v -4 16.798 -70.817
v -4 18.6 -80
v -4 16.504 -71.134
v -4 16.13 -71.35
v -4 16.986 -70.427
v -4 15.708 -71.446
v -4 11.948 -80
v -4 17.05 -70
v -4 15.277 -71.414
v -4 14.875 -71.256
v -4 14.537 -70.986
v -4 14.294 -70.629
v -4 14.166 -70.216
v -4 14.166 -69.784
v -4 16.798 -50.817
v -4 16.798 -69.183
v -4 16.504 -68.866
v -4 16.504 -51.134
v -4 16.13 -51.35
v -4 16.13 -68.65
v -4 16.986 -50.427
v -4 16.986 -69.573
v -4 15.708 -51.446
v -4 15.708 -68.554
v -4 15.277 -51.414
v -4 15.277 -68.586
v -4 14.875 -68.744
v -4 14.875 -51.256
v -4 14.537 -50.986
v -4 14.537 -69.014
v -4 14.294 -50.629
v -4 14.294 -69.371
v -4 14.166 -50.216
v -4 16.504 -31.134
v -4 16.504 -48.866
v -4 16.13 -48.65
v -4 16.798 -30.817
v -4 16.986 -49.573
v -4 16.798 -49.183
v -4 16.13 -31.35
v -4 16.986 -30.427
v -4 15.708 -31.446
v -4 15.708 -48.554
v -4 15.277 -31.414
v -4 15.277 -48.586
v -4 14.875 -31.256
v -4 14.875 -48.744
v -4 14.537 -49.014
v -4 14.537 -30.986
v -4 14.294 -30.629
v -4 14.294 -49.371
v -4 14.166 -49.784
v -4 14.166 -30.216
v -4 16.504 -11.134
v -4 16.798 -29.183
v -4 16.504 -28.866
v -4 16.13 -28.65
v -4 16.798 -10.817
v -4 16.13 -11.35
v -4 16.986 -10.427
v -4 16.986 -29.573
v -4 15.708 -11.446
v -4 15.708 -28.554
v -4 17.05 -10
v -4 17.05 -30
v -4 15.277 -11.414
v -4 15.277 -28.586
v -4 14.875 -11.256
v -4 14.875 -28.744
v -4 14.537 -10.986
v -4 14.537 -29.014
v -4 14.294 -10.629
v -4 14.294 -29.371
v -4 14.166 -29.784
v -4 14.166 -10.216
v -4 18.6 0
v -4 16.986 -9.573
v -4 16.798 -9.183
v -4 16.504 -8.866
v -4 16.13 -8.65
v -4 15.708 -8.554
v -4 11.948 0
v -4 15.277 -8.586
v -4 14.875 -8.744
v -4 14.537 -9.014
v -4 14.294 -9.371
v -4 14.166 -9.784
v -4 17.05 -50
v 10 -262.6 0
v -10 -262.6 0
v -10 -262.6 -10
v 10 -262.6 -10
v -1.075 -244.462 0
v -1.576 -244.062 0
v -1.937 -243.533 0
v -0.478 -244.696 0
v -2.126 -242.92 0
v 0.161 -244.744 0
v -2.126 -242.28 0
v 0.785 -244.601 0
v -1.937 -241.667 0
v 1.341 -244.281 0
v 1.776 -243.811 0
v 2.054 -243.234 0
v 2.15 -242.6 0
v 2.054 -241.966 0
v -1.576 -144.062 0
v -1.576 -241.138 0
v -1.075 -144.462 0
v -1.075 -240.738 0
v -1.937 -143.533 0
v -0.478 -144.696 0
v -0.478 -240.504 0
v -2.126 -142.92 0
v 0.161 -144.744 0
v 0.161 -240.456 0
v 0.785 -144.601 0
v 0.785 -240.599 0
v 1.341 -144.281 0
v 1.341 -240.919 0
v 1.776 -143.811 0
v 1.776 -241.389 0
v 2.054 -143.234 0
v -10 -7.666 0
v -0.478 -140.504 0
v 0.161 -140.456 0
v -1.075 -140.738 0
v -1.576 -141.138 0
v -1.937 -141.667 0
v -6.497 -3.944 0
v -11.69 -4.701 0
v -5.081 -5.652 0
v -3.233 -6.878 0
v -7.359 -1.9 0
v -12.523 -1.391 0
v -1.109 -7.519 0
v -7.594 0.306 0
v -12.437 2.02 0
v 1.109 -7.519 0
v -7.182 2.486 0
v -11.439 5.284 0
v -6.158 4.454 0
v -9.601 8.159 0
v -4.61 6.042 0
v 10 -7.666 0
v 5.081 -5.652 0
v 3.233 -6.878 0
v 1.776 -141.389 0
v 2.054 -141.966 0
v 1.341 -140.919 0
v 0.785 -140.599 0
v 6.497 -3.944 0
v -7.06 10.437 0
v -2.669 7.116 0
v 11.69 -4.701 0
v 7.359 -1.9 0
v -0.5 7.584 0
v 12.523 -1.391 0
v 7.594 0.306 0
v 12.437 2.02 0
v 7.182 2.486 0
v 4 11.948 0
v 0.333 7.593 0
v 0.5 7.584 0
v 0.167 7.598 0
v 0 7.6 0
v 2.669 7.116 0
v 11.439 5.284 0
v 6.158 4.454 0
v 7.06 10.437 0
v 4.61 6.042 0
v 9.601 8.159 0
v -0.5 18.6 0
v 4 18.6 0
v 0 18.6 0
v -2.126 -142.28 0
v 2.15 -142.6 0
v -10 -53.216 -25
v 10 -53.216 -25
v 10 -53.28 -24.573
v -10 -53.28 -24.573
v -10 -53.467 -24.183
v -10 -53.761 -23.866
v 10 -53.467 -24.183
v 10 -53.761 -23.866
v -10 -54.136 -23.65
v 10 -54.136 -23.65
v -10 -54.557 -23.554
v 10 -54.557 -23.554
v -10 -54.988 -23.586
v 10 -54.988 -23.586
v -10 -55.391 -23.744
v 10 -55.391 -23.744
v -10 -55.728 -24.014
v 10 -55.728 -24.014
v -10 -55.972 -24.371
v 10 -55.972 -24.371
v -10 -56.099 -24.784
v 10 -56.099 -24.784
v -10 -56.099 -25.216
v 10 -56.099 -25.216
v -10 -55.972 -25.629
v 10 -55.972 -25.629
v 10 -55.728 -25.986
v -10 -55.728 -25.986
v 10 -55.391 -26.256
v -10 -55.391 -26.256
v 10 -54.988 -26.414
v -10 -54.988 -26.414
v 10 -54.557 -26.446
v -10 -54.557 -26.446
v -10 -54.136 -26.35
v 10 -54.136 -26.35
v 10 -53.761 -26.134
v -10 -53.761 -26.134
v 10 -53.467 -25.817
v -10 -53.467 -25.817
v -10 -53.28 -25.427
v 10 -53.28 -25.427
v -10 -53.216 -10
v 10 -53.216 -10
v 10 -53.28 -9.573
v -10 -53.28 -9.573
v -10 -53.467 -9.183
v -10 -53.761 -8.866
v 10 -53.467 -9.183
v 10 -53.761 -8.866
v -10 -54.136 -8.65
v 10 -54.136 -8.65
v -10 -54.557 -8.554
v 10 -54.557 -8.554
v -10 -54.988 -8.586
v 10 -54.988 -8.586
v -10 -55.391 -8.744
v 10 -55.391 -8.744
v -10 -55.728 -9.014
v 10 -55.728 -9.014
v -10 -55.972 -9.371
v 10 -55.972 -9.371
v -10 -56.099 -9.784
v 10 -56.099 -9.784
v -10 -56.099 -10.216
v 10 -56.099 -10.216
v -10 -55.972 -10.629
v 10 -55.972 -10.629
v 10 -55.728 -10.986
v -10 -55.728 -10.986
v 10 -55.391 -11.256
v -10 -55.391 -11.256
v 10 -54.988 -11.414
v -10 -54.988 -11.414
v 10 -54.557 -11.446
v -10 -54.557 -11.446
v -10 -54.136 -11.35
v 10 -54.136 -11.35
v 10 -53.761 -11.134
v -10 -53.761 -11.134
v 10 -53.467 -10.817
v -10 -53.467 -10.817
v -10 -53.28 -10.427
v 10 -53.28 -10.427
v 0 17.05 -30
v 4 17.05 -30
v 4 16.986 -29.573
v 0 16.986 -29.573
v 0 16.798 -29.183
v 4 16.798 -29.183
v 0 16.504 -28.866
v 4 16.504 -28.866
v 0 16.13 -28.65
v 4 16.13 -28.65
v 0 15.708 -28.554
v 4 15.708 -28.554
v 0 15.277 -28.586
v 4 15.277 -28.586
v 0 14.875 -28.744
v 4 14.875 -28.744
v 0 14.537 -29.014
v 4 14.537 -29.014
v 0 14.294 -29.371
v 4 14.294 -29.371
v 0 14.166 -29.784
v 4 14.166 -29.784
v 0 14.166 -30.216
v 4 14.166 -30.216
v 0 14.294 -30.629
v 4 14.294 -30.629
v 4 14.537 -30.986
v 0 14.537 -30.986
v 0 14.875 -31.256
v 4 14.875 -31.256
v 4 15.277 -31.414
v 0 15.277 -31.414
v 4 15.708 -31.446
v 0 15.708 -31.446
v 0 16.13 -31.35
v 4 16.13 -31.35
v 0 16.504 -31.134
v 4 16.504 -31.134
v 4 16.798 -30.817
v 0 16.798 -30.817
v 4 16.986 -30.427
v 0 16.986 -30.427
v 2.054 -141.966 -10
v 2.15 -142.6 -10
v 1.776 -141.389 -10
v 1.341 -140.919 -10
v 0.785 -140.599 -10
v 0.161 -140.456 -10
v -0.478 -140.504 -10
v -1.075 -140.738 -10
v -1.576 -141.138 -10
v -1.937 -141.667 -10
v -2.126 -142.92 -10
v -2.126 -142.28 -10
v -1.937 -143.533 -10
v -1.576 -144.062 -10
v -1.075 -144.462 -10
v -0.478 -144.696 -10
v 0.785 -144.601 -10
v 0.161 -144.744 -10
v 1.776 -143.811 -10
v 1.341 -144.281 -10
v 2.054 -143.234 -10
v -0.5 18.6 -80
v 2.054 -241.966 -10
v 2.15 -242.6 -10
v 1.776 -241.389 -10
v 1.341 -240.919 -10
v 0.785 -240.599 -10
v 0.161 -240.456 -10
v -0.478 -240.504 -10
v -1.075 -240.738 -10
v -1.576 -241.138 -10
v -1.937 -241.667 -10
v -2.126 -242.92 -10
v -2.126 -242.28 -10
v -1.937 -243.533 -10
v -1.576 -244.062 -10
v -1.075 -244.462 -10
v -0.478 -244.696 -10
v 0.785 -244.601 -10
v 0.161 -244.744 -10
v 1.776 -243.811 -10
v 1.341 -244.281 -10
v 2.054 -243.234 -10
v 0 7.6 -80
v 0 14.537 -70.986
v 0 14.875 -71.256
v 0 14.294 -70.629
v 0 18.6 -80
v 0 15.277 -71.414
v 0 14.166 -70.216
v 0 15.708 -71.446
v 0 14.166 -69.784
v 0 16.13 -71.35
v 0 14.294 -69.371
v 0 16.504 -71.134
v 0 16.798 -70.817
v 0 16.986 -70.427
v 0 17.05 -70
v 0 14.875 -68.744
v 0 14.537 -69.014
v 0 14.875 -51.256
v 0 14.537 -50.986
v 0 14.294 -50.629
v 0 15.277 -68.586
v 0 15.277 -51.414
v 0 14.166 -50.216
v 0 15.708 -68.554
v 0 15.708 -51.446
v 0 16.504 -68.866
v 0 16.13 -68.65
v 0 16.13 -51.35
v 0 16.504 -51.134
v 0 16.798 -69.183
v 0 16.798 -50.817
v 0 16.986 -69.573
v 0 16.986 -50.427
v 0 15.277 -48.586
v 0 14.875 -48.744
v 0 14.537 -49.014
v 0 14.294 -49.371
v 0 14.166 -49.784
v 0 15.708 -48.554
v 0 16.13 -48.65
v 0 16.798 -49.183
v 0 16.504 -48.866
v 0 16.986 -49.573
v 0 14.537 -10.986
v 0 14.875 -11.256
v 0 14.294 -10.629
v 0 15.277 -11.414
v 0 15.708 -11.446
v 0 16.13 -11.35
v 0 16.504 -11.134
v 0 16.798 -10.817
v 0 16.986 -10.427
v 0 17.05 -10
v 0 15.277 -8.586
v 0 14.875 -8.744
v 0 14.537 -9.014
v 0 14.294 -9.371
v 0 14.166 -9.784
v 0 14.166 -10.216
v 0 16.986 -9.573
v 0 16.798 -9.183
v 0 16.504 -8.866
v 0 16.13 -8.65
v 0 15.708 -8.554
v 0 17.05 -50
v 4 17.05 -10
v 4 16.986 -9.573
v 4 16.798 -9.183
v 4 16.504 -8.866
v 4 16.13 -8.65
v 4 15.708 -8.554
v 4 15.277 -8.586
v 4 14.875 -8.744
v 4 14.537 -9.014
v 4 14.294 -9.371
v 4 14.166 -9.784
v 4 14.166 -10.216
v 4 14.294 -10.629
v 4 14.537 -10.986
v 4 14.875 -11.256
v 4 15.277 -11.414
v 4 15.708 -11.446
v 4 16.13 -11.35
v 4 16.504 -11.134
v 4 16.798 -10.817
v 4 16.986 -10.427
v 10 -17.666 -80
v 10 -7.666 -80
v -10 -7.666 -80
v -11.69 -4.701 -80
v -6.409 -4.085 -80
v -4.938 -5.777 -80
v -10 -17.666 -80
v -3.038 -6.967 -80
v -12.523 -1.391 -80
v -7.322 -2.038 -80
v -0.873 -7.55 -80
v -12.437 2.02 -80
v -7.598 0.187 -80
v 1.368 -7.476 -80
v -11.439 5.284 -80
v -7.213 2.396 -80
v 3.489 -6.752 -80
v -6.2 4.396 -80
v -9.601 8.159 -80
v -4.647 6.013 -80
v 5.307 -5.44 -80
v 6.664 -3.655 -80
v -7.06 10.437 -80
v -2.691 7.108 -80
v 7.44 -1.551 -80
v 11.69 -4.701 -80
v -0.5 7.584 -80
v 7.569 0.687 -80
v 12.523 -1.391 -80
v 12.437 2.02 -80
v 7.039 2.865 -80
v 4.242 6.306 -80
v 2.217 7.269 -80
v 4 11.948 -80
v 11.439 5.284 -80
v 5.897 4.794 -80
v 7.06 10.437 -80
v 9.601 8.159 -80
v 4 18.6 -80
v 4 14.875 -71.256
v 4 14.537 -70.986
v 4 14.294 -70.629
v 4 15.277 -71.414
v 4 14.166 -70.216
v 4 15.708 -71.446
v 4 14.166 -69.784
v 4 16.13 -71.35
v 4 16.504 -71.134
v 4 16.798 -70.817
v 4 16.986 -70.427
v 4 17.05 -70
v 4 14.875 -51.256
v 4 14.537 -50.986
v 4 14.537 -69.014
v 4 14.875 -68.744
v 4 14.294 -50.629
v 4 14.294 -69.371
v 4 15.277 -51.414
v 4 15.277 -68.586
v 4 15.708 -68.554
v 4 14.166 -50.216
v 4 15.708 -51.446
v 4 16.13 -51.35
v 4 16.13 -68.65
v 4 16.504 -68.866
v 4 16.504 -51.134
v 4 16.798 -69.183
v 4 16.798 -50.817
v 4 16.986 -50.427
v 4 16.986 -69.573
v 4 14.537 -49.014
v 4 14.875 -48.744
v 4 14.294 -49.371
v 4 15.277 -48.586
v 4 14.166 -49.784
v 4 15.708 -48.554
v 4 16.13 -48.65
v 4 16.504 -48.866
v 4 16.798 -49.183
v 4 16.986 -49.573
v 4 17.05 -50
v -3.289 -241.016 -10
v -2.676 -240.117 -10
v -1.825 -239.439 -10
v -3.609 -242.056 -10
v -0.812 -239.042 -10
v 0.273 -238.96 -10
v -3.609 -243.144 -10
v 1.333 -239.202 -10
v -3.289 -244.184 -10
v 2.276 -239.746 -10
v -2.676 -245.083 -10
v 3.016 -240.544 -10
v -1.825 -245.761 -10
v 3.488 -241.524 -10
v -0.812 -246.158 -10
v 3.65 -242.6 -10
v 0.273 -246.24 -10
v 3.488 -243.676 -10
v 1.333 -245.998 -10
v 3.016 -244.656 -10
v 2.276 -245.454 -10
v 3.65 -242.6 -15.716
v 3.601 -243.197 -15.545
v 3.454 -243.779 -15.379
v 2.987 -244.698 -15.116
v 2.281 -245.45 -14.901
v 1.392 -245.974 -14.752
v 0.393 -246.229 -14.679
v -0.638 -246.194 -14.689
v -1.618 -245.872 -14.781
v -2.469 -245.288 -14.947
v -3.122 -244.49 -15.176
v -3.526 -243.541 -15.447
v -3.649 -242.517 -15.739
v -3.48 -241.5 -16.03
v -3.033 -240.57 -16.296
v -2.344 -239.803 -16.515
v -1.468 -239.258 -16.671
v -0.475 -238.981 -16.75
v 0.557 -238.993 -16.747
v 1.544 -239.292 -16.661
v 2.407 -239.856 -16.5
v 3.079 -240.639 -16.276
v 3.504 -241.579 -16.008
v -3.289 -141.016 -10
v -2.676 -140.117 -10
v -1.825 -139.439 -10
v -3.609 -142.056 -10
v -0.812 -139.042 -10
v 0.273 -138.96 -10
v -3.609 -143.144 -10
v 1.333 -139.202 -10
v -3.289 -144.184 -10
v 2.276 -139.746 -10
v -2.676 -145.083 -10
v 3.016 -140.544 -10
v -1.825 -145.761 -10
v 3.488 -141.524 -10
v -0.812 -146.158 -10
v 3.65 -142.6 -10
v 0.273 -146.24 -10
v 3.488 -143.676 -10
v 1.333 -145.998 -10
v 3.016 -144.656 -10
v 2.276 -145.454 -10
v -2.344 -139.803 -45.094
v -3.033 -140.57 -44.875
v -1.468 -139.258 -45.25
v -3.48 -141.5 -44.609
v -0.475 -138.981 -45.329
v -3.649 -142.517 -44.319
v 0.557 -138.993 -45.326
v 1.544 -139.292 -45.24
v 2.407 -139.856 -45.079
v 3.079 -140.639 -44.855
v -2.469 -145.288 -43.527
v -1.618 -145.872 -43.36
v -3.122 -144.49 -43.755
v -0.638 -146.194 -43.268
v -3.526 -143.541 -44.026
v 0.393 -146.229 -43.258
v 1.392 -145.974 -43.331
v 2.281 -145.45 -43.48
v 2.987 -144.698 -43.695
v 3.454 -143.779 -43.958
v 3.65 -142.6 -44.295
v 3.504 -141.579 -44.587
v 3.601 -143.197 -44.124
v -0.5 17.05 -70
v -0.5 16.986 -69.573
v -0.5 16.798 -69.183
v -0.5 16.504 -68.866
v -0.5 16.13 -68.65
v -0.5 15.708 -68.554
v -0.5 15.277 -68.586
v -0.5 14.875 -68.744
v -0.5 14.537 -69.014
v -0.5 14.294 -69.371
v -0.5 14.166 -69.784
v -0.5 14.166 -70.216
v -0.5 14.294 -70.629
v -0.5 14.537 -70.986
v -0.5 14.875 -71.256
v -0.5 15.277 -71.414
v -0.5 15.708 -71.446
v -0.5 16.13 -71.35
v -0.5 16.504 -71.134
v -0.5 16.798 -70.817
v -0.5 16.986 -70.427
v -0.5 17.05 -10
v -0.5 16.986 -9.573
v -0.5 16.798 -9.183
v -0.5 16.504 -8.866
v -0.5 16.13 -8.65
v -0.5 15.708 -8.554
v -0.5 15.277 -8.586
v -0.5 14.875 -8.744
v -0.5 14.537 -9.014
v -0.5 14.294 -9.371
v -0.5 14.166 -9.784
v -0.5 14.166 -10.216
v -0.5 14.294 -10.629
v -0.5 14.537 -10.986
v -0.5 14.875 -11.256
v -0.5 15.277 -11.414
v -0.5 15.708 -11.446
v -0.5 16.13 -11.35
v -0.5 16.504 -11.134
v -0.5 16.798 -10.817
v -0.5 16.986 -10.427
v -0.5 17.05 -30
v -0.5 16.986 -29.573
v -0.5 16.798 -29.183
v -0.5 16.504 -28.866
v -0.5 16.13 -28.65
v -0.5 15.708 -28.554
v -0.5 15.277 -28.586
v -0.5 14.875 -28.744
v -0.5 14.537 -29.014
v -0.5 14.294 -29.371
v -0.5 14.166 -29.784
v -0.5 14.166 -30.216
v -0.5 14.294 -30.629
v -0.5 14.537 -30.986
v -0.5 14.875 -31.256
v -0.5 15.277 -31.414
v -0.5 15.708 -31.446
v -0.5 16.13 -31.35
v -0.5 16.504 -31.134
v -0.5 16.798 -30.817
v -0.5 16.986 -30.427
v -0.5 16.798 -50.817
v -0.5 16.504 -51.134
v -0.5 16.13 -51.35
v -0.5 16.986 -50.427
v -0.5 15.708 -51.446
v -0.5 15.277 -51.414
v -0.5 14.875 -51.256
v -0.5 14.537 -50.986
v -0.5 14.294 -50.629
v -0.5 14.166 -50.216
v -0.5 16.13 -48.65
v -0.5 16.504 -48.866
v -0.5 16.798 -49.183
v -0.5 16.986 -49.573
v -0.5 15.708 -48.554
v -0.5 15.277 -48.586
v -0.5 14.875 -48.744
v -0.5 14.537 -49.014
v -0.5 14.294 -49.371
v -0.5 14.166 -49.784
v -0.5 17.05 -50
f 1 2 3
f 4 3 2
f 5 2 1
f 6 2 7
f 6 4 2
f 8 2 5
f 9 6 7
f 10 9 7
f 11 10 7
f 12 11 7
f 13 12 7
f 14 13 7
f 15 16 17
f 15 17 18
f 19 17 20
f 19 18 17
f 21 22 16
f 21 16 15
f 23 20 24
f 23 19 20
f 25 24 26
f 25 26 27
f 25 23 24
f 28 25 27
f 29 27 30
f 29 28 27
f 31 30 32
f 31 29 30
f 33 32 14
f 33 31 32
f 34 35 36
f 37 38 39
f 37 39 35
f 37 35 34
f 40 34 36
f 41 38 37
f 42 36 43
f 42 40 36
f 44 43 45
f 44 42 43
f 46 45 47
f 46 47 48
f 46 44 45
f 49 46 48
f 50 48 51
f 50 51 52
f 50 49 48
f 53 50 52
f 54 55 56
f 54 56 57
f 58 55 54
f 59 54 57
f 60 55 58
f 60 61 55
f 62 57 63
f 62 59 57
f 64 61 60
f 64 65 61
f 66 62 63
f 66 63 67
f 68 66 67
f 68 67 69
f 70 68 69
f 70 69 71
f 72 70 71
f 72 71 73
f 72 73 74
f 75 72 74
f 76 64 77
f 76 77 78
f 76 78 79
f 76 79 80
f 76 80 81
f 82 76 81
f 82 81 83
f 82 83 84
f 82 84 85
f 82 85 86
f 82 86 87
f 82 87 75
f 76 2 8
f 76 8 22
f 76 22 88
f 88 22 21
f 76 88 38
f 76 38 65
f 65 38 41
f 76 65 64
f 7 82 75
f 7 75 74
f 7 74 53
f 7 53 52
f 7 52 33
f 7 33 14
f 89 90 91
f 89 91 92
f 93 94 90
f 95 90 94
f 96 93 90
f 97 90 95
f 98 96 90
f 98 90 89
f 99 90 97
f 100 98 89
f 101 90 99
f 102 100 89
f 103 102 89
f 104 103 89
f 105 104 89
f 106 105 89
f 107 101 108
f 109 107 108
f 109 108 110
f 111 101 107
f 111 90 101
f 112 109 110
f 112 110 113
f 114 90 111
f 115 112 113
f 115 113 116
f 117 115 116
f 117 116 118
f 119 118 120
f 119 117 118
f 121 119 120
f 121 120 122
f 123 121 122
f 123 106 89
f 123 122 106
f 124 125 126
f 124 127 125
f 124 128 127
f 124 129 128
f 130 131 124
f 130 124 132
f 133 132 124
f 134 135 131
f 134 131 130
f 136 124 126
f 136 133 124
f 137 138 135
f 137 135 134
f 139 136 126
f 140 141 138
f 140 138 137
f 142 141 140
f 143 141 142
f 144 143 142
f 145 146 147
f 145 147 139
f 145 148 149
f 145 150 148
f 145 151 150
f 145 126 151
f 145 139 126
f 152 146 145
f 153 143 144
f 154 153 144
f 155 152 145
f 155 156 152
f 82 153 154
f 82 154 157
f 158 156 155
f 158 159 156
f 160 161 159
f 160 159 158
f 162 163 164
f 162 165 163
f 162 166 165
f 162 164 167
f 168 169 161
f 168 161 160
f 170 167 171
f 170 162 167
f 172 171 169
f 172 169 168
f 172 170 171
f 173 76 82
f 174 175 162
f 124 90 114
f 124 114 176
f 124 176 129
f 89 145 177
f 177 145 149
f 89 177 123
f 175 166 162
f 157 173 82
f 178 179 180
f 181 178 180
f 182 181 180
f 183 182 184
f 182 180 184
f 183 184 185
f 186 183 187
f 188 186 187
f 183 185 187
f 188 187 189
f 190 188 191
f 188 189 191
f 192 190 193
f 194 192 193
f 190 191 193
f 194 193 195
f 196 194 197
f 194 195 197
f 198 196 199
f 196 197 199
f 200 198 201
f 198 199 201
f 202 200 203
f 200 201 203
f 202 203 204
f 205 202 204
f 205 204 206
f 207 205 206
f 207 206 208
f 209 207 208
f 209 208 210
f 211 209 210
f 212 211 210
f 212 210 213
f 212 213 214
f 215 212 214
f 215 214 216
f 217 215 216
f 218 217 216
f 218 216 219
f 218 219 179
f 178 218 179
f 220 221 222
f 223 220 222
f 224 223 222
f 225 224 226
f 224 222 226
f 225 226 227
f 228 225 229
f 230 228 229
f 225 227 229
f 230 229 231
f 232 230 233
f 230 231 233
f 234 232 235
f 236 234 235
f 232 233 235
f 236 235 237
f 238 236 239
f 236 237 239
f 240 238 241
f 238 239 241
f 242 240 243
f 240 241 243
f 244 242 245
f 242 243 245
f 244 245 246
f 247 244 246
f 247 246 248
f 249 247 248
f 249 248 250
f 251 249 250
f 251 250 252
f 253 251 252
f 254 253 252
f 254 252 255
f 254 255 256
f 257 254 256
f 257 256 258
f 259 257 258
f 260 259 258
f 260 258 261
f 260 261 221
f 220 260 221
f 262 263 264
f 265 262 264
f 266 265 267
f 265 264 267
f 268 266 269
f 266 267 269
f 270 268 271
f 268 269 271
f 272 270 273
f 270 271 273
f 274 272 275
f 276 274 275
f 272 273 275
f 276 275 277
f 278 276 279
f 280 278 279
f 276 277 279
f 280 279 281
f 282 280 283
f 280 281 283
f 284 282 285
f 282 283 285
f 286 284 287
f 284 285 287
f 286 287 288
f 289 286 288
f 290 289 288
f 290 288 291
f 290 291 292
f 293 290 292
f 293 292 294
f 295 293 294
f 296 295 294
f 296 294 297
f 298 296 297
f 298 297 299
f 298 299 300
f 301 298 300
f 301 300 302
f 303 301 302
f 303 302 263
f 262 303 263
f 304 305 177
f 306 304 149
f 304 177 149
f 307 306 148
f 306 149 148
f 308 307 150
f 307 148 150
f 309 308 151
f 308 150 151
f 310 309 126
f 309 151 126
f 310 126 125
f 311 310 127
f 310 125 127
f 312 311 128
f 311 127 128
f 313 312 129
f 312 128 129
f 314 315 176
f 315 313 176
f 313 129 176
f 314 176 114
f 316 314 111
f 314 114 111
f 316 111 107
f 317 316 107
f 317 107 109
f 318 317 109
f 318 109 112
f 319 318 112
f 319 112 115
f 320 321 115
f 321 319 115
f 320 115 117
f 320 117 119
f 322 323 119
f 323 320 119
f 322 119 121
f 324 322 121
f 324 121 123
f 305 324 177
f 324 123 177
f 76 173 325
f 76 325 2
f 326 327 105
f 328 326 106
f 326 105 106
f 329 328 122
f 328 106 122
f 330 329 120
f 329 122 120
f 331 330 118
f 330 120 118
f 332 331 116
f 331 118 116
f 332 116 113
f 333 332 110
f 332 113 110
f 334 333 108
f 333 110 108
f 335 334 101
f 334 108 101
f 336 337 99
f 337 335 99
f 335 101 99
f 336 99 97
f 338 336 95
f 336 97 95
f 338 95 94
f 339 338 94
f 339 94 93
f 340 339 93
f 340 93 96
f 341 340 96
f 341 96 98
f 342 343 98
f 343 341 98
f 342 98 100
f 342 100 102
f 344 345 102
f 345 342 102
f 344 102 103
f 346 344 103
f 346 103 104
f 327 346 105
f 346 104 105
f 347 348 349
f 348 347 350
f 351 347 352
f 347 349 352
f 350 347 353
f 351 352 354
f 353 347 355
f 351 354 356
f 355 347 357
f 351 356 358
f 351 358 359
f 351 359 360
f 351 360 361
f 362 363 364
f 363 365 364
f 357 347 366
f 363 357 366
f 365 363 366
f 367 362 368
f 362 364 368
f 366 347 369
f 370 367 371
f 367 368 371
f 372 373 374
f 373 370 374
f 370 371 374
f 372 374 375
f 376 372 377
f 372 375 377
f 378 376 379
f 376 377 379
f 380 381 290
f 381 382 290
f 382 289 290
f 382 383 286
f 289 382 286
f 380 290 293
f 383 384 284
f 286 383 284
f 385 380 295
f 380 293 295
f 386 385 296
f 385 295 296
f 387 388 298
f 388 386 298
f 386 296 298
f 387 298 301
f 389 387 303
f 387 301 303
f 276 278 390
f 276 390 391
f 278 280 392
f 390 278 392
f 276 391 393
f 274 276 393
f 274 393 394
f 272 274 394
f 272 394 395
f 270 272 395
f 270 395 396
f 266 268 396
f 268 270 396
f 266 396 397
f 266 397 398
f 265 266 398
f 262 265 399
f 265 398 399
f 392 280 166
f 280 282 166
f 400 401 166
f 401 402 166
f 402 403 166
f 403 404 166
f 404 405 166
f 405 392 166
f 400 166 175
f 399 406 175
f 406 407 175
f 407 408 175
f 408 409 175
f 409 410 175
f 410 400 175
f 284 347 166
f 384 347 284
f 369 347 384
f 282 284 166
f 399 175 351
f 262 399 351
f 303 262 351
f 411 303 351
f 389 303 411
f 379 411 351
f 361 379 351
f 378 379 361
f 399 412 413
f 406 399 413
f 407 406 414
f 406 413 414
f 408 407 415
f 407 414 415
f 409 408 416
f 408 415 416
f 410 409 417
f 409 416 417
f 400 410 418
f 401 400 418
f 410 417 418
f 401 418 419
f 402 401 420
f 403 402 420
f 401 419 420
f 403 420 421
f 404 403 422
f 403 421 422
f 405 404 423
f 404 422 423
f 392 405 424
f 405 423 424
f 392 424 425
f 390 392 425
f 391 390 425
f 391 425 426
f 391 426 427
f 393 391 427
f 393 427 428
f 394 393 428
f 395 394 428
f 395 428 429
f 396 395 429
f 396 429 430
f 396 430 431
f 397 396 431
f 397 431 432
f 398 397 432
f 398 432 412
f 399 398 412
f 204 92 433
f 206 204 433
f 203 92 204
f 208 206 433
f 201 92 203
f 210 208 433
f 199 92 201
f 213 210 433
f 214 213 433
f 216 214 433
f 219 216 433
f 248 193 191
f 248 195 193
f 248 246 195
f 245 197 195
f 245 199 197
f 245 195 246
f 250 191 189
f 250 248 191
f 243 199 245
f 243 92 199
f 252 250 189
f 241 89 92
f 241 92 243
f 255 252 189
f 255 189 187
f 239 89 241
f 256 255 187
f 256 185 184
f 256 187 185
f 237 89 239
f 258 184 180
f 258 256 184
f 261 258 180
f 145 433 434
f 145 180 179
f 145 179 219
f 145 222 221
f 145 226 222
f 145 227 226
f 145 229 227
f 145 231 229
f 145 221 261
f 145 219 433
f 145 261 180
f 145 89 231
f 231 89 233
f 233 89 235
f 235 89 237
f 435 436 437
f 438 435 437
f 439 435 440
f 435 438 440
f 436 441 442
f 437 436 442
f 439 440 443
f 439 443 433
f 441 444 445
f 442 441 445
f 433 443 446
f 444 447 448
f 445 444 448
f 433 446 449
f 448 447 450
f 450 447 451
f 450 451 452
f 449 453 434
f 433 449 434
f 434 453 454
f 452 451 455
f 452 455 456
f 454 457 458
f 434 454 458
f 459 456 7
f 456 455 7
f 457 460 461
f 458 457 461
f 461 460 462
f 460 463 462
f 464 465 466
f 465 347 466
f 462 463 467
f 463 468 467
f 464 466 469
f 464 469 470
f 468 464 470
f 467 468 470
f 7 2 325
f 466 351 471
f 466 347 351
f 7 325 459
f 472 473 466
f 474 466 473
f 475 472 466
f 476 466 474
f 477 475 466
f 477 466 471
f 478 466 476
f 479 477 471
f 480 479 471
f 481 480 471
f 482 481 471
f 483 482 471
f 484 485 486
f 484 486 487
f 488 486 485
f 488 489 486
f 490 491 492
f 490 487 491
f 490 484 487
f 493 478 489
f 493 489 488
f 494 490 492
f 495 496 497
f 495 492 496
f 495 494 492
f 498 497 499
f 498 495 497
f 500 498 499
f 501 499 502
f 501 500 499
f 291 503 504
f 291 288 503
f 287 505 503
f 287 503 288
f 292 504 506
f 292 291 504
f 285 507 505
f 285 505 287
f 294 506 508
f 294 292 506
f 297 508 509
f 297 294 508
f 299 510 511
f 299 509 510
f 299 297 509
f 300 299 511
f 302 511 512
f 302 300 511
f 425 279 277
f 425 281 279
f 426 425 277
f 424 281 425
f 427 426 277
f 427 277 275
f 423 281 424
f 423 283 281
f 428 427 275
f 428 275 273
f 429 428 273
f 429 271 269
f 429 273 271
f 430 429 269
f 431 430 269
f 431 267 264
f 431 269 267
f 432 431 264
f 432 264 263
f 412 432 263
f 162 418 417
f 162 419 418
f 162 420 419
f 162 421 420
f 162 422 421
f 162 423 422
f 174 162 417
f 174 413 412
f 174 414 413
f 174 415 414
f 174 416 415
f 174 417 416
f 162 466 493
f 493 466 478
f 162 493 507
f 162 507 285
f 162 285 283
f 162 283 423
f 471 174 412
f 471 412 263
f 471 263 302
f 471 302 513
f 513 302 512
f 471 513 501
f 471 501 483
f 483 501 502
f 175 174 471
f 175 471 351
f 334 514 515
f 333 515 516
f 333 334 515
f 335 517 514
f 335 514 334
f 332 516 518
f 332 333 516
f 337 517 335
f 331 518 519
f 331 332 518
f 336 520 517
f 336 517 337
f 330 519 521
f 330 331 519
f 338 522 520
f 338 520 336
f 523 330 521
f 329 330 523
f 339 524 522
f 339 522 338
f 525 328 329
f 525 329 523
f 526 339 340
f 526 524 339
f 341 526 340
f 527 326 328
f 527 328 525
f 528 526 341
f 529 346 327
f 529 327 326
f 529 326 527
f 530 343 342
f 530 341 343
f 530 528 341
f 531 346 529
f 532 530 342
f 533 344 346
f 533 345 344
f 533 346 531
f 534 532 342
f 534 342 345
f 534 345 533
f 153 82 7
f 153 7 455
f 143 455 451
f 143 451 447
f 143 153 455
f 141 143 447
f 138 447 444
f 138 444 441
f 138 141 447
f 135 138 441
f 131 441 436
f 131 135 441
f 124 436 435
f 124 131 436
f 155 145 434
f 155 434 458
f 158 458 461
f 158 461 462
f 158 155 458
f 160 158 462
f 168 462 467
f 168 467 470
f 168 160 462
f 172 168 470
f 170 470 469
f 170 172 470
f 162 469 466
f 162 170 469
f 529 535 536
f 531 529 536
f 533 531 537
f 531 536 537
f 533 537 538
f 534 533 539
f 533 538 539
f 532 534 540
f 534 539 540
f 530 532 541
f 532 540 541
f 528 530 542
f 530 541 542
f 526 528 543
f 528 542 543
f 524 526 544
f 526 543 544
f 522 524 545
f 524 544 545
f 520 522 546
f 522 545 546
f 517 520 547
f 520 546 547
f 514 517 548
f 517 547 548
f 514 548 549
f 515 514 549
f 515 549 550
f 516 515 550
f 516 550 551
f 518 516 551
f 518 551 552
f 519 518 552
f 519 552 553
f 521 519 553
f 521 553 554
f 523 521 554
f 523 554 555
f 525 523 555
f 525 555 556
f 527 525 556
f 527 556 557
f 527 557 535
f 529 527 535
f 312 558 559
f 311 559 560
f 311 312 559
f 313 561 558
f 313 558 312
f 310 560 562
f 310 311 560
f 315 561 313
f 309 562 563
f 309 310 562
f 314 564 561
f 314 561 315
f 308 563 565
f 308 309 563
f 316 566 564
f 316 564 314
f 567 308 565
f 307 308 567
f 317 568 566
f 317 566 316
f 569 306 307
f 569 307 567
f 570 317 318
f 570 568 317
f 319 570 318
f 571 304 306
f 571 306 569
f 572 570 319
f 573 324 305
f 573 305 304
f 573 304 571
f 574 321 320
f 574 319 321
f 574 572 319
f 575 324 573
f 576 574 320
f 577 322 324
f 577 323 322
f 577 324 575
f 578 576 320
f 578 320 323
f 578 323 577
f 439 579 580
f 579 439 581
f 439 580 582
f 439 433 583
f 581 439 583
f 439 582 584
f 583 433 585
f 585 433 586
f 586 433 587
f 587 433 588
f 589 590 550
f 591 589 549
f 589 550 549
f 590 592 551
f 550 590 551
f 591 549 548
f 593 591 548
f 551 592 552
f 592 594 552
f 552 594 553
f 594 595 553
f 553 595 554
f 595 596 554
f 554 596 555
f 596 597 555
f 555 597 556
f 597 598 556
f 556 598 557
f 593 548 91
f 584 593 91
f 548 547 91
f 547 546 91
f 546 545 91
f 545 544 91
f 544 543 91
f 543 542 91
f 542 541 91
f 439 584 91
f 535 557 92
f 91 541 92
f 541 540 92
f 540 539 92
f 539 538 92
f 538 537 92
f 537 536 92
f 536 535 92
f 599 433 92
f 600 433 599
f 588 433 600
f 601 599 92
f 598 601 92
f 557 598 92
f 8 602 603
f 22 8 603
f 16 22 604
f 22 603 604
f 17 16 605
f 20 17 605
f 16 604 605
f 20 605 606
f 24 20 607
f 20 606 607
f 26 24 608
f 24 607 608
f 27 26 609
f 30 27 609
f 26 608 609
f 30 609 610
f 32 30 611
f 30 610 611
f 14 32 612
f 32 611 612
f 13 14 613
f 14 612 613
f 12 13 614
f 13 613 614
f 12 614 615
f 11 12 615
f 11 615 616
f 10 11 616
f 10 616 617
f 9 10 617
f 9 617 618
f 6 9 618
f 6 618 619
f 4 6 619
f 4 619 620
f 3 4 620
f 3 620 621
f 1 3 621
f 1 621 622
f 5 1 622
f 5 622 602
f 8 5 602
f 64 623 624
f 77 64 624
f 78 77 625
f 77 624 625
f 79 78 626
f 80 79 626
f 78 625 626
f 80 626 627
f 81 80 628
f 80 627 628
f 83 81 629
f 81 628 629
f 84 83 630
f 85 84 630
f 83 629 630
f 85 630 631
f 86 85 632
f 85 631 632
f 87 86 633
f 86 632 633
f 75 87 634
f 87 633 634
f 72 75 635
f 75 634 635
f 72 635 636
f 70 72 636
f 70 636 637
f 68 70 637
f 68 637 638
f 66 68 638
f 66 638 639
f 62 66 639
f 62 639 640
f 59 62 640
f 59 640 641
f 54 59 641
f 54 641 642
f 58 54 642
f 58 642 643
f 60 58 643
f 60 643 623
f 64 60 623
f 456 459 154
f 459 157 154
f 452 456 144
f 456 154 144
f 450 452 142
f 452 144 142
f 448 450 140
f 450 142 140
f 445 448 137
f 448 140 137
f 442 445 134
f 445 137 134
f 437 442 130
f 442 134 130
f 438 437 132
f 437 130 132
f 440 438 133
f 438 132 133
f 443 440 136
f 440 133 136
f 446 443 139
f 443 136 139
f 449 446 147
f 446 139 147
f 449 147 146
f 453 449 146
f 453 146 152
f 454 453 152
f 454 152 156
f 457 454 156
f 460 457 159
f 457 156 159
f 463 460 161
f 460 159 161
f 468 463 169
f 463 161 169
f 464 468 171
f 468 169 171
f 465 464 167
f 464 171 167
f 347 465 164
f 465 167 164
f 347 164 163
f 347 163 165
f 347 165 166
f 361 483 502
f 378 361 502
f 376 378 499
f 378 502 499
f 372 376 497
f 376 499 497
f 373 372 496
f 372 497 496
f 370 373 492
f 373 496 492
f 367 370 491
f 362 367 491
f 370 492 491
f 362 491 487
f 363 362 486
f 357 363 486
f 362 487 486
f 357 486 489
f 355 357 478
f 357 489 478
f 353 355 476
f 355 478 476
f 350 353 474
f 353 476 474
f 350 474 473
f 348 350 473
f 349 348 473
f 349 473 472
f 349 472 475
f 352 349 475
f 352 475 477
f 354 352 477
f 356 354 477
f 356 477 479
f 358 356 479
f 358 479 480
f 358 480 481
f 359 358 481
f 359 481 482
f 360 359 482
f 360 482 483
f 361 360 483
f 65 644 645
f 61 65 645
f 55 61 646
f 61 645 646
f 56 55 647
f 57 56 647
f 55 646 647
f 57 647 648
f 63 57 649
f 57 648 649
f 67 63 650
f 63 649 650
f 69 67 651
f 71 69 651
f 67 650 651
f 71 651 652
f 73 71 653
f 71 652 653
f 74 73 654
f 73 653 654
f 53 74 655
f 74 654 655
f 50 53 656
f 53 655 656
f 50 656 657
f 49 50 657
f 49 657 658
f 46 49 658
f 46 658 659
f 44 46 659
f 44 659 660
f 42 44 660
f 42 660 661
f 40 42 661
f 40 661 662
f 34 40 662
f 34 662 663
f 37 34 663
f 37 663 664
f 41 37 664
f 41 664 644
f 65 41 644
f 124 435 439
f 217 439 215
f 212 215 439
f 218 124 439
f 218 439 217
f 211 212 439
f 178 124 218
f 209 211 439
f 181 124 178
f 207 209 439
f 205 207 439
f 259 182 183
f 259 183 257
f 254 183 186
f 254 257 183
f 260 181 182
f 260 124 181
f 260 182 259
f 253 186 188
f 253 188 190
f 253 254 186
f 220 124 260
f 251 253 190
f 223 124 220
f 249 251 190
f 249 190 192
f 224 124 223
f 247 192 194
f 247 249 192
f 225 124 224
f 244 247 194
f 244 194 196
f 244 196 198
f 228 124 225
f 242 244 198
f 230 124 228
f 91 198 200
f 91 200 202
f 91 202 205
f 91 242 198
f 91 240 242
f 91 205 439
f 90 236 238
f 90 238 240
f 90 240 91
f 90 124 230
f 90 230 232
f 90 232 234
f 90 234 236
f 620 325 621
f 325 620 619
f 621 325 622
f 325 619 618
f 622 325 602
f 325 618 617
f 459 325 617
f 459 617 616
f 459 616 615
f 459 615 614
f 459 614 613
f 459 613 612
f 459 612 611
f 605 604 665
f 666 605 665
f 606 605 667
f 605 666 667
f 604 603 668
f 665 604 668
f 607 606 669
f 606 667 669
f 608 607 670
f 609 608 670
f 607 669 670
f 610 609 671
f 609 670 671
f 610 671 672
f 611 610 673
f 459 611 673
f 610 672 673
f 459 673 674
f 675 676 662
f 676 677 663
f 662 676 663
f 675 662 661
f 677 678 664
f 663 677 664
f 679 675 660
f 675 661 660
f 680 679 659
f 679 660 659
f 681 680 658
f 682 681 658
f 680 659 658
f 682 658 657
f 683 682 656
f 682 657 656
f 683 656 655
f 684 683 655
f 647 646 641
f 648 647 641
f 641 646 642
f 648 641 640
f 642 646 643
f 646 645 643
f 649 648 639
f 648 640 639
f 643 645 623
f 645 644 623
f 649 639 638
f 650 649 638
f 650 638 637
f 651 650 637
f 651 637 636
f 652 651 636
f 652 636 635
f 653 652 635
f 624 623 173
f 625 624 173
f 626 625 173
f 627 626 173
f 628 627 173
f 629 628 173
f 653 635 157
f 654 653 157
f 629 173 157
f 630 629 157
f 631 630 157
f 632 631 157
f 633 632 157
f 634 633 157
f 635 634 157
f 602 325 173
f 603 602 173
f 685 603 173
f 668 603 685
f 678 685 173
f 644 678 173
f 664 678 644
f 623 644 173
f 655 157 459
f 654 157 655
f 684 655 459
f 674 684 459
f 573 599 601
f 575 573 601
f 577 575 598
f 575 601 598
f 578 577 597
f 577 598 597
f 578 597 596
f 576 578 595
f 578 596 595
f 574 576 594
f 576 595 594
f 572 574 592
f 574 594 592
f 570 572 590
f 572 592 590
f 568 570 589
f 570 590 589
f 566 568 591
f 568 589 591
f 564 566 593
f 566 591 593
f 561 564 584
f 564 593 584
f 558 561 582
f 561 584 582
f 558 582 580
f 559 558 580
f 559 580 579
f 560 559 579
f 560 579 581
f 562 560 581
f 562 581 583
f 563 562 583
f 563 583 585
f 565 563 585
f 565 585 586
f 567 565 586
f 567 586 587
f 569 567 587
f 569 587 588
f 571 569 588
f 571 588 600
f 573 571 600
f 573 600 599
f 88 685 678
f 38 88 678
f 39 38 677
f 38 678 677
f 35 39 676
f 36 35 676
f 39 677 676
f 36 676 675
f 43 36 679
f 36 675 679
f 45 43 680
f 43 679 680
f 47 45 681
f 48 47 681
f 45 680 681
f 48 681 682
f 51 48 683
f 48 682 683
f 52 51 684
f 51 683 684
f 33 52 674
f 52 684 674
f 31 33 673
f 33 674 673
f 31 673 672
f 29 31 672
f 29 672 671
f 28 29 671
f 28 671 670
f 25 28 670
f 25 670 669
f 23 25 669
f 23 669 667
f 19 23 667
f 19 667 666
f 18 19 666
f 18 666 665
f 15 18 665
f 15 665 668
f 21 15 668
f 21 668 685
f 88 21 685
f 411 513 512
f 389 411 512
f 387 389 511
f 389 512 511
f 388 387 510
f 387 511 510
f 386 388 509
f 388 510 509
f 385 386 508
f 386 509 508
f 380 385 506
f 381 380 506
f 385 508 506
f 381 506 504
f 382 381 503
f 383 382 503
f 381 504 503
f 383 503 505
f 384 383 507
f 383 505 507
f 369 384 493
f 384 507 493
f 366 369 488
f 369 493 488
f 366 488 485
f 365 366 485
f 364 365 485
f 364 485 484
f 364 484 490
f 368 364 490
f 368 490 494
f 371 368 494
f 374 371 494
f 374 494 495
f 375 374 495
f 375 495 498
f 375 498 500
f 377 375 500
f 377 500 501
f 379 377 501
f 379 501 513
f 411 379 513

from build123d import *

# Parameters (mm, degrees)
F1_DEPTH  = 80
F0_R      = 7.6
F2_DEPTH  = 80
F3_R      = 2.15
F4_DEPTH  = 80.001
F5_R      = 3.65
F5_R_2    = 2.15
F6_DEPTH  = 70
F8_DEPTH  = 22.601
F10_DEPTH = 80.001
F11_R     = 1.45
F12_DEPTH = 16.601
F13_R     = 1.45
F14_DEPTH = 22.601


with BuildPart() as f1:
    # F0 (on Top) → F1 (new body)
    with BuildSketch(Plane.XY):
        with BuildLine():
            ThreePointArc((10, -7.6655071587), (0, -12.6), (-10, -7.6655071587))
            Line((-10, -7.6655071587), (-10, -262.6))
            Line((-10, -262.6), (10, -262.6))
            Line((10, -262.6), (10, -7.6655071587))
        make_face()
    extrude(amount=-F1_DEPTH)

    # F0 (on Top) → F2 (join)
    with BuildSketch(Plane.XY):
        with BuildLine():
            Line((-4, 18.6), (-4, 11.948221625))
            ThreePointArc((-4, 11.948221625), (-12.0488418199, 3.685839226), (-10, -7.6655071587))
            ThreePointArc((-10, -7.6655071587), (0, -12.6), (10, -7.6655071587))
            ThreePointArc((10, -7.6655071587), (12.0488418199, 3.685839226), (4, 11.948221625))
            Line((4, 11.948221625), (4, 18.6))
            Line((4, 18.6), (-4, 18.6))
        make_face()
        Circle(F0_R, mode=Mode.SUBTRACT)
    extrude(amount=-F2_DEPTH)

    # F3 (on face) → F4 (cut, through all)
    with BuildSketch(Plane.XY):
        with Locations((0, -142.6)):
            Circle(F3_R)
        with Locations((0, -242.6)):
            Circle(F3_R)
    extrude(amount=-F4_DEPTH, mode=Mode.SUBTRACT)

    # F5 (on face) → F6 (cut)
    with BuildSketch(Plane(origin=(0, 0, -80), x_dir=(1, 0, 0), z_dir=(0, 0, -1))):
        with Locations((0, 242.6)):
            Circle(F5_R)
        with Locations((0, 242.6)):
            Circle(F5_R_2, mode=Mode.SUBTRACT)
        with Locations((0, 142.6)):
            Circle(F5_R)
        with Locations((0, 142.6)):
            Circle(F5_R_2, mode=Mode.SUBTRACT)
    extrude(amount=-F6_DEPTH, mode=Mode.SUBTRACT)

    # F7 (on face) → F8 (cut, through all)
    with BuildSketch(Plane.YZ.offset(10)):
        Polygon((-262.6, -80), (-17.6655071587, -80), (-262.6, -10), align=None)
    extrude(amount=-F8_DEPTH, mode=Mode.SUBTRACT)

    # F9 (on face) → F10 (cut, through all)
    with BuildSketch(Plane.XY):
        with BuildLine():
            Line((0, 7.6), (0, 18.6))
            Line((0, 18.6), (-0.5, 18.6))
            Line((-0.5, 18.6), (-0.5, 7.5835347959))
            ThreePointArc((-0.5, 7.5835347959), (-0.2501355147, 7.5958825836), (0, 7.6))
        make_face()
        with BuildLine():
            ThreePointArc((0.5, 7.5835347959), (0.2501355147, 7.5958825836), (0, 7.6))
            Line((0, 7.6), (0, 0))
            Line((0, 0), (0.5, 0))
            Line((0.5, 0), (0.5, 7.5835347959))
        make_face()
        with BuildLine():
            Line((0, 0), (0, 7.6))
            ThreePointArc((0, 7.6), (-0.2501355147, 7.5958825836), (-0.5, 7.5835347959))
            Line((-0.5, 7.5835347959), (-0.5, 0))
            Line((-0.5, 0), (0, 0))
        make_face()
    extrude(amount=-F10_DEPTH, mode=Mode.SUBTRACT)

    # F11 (on face) → F12 (cut, through all)
    with BuildSketch(Plane.YZ.offset(4)):
        with Locations((15.6, -30)):
            Circle(F11_R)
        with Locations((15.6, -70)):
            Circle(F11_R)
        with Locations((15.6, -50)):
            Circle(F11_R)
        with Locations((15.6, -10)):
            Circle(F11_R)
    extrude(amount=-F12_DEPTH, mode=Mode.SUBTRACT)

    # F13 (on face) → F14 (cut, through all)
    with BuildSketch(Plane.YZ.offset(10)):
        with Locations((-54.6655071587, -10)):
            Circle(F13_R)
        with Locations((-54.6655071587, -25)):
            Circle(F13_R)
    extrude(amount=-F14_DEPTH, mode=Mode.SUBTRACT)


solid = f1.part
